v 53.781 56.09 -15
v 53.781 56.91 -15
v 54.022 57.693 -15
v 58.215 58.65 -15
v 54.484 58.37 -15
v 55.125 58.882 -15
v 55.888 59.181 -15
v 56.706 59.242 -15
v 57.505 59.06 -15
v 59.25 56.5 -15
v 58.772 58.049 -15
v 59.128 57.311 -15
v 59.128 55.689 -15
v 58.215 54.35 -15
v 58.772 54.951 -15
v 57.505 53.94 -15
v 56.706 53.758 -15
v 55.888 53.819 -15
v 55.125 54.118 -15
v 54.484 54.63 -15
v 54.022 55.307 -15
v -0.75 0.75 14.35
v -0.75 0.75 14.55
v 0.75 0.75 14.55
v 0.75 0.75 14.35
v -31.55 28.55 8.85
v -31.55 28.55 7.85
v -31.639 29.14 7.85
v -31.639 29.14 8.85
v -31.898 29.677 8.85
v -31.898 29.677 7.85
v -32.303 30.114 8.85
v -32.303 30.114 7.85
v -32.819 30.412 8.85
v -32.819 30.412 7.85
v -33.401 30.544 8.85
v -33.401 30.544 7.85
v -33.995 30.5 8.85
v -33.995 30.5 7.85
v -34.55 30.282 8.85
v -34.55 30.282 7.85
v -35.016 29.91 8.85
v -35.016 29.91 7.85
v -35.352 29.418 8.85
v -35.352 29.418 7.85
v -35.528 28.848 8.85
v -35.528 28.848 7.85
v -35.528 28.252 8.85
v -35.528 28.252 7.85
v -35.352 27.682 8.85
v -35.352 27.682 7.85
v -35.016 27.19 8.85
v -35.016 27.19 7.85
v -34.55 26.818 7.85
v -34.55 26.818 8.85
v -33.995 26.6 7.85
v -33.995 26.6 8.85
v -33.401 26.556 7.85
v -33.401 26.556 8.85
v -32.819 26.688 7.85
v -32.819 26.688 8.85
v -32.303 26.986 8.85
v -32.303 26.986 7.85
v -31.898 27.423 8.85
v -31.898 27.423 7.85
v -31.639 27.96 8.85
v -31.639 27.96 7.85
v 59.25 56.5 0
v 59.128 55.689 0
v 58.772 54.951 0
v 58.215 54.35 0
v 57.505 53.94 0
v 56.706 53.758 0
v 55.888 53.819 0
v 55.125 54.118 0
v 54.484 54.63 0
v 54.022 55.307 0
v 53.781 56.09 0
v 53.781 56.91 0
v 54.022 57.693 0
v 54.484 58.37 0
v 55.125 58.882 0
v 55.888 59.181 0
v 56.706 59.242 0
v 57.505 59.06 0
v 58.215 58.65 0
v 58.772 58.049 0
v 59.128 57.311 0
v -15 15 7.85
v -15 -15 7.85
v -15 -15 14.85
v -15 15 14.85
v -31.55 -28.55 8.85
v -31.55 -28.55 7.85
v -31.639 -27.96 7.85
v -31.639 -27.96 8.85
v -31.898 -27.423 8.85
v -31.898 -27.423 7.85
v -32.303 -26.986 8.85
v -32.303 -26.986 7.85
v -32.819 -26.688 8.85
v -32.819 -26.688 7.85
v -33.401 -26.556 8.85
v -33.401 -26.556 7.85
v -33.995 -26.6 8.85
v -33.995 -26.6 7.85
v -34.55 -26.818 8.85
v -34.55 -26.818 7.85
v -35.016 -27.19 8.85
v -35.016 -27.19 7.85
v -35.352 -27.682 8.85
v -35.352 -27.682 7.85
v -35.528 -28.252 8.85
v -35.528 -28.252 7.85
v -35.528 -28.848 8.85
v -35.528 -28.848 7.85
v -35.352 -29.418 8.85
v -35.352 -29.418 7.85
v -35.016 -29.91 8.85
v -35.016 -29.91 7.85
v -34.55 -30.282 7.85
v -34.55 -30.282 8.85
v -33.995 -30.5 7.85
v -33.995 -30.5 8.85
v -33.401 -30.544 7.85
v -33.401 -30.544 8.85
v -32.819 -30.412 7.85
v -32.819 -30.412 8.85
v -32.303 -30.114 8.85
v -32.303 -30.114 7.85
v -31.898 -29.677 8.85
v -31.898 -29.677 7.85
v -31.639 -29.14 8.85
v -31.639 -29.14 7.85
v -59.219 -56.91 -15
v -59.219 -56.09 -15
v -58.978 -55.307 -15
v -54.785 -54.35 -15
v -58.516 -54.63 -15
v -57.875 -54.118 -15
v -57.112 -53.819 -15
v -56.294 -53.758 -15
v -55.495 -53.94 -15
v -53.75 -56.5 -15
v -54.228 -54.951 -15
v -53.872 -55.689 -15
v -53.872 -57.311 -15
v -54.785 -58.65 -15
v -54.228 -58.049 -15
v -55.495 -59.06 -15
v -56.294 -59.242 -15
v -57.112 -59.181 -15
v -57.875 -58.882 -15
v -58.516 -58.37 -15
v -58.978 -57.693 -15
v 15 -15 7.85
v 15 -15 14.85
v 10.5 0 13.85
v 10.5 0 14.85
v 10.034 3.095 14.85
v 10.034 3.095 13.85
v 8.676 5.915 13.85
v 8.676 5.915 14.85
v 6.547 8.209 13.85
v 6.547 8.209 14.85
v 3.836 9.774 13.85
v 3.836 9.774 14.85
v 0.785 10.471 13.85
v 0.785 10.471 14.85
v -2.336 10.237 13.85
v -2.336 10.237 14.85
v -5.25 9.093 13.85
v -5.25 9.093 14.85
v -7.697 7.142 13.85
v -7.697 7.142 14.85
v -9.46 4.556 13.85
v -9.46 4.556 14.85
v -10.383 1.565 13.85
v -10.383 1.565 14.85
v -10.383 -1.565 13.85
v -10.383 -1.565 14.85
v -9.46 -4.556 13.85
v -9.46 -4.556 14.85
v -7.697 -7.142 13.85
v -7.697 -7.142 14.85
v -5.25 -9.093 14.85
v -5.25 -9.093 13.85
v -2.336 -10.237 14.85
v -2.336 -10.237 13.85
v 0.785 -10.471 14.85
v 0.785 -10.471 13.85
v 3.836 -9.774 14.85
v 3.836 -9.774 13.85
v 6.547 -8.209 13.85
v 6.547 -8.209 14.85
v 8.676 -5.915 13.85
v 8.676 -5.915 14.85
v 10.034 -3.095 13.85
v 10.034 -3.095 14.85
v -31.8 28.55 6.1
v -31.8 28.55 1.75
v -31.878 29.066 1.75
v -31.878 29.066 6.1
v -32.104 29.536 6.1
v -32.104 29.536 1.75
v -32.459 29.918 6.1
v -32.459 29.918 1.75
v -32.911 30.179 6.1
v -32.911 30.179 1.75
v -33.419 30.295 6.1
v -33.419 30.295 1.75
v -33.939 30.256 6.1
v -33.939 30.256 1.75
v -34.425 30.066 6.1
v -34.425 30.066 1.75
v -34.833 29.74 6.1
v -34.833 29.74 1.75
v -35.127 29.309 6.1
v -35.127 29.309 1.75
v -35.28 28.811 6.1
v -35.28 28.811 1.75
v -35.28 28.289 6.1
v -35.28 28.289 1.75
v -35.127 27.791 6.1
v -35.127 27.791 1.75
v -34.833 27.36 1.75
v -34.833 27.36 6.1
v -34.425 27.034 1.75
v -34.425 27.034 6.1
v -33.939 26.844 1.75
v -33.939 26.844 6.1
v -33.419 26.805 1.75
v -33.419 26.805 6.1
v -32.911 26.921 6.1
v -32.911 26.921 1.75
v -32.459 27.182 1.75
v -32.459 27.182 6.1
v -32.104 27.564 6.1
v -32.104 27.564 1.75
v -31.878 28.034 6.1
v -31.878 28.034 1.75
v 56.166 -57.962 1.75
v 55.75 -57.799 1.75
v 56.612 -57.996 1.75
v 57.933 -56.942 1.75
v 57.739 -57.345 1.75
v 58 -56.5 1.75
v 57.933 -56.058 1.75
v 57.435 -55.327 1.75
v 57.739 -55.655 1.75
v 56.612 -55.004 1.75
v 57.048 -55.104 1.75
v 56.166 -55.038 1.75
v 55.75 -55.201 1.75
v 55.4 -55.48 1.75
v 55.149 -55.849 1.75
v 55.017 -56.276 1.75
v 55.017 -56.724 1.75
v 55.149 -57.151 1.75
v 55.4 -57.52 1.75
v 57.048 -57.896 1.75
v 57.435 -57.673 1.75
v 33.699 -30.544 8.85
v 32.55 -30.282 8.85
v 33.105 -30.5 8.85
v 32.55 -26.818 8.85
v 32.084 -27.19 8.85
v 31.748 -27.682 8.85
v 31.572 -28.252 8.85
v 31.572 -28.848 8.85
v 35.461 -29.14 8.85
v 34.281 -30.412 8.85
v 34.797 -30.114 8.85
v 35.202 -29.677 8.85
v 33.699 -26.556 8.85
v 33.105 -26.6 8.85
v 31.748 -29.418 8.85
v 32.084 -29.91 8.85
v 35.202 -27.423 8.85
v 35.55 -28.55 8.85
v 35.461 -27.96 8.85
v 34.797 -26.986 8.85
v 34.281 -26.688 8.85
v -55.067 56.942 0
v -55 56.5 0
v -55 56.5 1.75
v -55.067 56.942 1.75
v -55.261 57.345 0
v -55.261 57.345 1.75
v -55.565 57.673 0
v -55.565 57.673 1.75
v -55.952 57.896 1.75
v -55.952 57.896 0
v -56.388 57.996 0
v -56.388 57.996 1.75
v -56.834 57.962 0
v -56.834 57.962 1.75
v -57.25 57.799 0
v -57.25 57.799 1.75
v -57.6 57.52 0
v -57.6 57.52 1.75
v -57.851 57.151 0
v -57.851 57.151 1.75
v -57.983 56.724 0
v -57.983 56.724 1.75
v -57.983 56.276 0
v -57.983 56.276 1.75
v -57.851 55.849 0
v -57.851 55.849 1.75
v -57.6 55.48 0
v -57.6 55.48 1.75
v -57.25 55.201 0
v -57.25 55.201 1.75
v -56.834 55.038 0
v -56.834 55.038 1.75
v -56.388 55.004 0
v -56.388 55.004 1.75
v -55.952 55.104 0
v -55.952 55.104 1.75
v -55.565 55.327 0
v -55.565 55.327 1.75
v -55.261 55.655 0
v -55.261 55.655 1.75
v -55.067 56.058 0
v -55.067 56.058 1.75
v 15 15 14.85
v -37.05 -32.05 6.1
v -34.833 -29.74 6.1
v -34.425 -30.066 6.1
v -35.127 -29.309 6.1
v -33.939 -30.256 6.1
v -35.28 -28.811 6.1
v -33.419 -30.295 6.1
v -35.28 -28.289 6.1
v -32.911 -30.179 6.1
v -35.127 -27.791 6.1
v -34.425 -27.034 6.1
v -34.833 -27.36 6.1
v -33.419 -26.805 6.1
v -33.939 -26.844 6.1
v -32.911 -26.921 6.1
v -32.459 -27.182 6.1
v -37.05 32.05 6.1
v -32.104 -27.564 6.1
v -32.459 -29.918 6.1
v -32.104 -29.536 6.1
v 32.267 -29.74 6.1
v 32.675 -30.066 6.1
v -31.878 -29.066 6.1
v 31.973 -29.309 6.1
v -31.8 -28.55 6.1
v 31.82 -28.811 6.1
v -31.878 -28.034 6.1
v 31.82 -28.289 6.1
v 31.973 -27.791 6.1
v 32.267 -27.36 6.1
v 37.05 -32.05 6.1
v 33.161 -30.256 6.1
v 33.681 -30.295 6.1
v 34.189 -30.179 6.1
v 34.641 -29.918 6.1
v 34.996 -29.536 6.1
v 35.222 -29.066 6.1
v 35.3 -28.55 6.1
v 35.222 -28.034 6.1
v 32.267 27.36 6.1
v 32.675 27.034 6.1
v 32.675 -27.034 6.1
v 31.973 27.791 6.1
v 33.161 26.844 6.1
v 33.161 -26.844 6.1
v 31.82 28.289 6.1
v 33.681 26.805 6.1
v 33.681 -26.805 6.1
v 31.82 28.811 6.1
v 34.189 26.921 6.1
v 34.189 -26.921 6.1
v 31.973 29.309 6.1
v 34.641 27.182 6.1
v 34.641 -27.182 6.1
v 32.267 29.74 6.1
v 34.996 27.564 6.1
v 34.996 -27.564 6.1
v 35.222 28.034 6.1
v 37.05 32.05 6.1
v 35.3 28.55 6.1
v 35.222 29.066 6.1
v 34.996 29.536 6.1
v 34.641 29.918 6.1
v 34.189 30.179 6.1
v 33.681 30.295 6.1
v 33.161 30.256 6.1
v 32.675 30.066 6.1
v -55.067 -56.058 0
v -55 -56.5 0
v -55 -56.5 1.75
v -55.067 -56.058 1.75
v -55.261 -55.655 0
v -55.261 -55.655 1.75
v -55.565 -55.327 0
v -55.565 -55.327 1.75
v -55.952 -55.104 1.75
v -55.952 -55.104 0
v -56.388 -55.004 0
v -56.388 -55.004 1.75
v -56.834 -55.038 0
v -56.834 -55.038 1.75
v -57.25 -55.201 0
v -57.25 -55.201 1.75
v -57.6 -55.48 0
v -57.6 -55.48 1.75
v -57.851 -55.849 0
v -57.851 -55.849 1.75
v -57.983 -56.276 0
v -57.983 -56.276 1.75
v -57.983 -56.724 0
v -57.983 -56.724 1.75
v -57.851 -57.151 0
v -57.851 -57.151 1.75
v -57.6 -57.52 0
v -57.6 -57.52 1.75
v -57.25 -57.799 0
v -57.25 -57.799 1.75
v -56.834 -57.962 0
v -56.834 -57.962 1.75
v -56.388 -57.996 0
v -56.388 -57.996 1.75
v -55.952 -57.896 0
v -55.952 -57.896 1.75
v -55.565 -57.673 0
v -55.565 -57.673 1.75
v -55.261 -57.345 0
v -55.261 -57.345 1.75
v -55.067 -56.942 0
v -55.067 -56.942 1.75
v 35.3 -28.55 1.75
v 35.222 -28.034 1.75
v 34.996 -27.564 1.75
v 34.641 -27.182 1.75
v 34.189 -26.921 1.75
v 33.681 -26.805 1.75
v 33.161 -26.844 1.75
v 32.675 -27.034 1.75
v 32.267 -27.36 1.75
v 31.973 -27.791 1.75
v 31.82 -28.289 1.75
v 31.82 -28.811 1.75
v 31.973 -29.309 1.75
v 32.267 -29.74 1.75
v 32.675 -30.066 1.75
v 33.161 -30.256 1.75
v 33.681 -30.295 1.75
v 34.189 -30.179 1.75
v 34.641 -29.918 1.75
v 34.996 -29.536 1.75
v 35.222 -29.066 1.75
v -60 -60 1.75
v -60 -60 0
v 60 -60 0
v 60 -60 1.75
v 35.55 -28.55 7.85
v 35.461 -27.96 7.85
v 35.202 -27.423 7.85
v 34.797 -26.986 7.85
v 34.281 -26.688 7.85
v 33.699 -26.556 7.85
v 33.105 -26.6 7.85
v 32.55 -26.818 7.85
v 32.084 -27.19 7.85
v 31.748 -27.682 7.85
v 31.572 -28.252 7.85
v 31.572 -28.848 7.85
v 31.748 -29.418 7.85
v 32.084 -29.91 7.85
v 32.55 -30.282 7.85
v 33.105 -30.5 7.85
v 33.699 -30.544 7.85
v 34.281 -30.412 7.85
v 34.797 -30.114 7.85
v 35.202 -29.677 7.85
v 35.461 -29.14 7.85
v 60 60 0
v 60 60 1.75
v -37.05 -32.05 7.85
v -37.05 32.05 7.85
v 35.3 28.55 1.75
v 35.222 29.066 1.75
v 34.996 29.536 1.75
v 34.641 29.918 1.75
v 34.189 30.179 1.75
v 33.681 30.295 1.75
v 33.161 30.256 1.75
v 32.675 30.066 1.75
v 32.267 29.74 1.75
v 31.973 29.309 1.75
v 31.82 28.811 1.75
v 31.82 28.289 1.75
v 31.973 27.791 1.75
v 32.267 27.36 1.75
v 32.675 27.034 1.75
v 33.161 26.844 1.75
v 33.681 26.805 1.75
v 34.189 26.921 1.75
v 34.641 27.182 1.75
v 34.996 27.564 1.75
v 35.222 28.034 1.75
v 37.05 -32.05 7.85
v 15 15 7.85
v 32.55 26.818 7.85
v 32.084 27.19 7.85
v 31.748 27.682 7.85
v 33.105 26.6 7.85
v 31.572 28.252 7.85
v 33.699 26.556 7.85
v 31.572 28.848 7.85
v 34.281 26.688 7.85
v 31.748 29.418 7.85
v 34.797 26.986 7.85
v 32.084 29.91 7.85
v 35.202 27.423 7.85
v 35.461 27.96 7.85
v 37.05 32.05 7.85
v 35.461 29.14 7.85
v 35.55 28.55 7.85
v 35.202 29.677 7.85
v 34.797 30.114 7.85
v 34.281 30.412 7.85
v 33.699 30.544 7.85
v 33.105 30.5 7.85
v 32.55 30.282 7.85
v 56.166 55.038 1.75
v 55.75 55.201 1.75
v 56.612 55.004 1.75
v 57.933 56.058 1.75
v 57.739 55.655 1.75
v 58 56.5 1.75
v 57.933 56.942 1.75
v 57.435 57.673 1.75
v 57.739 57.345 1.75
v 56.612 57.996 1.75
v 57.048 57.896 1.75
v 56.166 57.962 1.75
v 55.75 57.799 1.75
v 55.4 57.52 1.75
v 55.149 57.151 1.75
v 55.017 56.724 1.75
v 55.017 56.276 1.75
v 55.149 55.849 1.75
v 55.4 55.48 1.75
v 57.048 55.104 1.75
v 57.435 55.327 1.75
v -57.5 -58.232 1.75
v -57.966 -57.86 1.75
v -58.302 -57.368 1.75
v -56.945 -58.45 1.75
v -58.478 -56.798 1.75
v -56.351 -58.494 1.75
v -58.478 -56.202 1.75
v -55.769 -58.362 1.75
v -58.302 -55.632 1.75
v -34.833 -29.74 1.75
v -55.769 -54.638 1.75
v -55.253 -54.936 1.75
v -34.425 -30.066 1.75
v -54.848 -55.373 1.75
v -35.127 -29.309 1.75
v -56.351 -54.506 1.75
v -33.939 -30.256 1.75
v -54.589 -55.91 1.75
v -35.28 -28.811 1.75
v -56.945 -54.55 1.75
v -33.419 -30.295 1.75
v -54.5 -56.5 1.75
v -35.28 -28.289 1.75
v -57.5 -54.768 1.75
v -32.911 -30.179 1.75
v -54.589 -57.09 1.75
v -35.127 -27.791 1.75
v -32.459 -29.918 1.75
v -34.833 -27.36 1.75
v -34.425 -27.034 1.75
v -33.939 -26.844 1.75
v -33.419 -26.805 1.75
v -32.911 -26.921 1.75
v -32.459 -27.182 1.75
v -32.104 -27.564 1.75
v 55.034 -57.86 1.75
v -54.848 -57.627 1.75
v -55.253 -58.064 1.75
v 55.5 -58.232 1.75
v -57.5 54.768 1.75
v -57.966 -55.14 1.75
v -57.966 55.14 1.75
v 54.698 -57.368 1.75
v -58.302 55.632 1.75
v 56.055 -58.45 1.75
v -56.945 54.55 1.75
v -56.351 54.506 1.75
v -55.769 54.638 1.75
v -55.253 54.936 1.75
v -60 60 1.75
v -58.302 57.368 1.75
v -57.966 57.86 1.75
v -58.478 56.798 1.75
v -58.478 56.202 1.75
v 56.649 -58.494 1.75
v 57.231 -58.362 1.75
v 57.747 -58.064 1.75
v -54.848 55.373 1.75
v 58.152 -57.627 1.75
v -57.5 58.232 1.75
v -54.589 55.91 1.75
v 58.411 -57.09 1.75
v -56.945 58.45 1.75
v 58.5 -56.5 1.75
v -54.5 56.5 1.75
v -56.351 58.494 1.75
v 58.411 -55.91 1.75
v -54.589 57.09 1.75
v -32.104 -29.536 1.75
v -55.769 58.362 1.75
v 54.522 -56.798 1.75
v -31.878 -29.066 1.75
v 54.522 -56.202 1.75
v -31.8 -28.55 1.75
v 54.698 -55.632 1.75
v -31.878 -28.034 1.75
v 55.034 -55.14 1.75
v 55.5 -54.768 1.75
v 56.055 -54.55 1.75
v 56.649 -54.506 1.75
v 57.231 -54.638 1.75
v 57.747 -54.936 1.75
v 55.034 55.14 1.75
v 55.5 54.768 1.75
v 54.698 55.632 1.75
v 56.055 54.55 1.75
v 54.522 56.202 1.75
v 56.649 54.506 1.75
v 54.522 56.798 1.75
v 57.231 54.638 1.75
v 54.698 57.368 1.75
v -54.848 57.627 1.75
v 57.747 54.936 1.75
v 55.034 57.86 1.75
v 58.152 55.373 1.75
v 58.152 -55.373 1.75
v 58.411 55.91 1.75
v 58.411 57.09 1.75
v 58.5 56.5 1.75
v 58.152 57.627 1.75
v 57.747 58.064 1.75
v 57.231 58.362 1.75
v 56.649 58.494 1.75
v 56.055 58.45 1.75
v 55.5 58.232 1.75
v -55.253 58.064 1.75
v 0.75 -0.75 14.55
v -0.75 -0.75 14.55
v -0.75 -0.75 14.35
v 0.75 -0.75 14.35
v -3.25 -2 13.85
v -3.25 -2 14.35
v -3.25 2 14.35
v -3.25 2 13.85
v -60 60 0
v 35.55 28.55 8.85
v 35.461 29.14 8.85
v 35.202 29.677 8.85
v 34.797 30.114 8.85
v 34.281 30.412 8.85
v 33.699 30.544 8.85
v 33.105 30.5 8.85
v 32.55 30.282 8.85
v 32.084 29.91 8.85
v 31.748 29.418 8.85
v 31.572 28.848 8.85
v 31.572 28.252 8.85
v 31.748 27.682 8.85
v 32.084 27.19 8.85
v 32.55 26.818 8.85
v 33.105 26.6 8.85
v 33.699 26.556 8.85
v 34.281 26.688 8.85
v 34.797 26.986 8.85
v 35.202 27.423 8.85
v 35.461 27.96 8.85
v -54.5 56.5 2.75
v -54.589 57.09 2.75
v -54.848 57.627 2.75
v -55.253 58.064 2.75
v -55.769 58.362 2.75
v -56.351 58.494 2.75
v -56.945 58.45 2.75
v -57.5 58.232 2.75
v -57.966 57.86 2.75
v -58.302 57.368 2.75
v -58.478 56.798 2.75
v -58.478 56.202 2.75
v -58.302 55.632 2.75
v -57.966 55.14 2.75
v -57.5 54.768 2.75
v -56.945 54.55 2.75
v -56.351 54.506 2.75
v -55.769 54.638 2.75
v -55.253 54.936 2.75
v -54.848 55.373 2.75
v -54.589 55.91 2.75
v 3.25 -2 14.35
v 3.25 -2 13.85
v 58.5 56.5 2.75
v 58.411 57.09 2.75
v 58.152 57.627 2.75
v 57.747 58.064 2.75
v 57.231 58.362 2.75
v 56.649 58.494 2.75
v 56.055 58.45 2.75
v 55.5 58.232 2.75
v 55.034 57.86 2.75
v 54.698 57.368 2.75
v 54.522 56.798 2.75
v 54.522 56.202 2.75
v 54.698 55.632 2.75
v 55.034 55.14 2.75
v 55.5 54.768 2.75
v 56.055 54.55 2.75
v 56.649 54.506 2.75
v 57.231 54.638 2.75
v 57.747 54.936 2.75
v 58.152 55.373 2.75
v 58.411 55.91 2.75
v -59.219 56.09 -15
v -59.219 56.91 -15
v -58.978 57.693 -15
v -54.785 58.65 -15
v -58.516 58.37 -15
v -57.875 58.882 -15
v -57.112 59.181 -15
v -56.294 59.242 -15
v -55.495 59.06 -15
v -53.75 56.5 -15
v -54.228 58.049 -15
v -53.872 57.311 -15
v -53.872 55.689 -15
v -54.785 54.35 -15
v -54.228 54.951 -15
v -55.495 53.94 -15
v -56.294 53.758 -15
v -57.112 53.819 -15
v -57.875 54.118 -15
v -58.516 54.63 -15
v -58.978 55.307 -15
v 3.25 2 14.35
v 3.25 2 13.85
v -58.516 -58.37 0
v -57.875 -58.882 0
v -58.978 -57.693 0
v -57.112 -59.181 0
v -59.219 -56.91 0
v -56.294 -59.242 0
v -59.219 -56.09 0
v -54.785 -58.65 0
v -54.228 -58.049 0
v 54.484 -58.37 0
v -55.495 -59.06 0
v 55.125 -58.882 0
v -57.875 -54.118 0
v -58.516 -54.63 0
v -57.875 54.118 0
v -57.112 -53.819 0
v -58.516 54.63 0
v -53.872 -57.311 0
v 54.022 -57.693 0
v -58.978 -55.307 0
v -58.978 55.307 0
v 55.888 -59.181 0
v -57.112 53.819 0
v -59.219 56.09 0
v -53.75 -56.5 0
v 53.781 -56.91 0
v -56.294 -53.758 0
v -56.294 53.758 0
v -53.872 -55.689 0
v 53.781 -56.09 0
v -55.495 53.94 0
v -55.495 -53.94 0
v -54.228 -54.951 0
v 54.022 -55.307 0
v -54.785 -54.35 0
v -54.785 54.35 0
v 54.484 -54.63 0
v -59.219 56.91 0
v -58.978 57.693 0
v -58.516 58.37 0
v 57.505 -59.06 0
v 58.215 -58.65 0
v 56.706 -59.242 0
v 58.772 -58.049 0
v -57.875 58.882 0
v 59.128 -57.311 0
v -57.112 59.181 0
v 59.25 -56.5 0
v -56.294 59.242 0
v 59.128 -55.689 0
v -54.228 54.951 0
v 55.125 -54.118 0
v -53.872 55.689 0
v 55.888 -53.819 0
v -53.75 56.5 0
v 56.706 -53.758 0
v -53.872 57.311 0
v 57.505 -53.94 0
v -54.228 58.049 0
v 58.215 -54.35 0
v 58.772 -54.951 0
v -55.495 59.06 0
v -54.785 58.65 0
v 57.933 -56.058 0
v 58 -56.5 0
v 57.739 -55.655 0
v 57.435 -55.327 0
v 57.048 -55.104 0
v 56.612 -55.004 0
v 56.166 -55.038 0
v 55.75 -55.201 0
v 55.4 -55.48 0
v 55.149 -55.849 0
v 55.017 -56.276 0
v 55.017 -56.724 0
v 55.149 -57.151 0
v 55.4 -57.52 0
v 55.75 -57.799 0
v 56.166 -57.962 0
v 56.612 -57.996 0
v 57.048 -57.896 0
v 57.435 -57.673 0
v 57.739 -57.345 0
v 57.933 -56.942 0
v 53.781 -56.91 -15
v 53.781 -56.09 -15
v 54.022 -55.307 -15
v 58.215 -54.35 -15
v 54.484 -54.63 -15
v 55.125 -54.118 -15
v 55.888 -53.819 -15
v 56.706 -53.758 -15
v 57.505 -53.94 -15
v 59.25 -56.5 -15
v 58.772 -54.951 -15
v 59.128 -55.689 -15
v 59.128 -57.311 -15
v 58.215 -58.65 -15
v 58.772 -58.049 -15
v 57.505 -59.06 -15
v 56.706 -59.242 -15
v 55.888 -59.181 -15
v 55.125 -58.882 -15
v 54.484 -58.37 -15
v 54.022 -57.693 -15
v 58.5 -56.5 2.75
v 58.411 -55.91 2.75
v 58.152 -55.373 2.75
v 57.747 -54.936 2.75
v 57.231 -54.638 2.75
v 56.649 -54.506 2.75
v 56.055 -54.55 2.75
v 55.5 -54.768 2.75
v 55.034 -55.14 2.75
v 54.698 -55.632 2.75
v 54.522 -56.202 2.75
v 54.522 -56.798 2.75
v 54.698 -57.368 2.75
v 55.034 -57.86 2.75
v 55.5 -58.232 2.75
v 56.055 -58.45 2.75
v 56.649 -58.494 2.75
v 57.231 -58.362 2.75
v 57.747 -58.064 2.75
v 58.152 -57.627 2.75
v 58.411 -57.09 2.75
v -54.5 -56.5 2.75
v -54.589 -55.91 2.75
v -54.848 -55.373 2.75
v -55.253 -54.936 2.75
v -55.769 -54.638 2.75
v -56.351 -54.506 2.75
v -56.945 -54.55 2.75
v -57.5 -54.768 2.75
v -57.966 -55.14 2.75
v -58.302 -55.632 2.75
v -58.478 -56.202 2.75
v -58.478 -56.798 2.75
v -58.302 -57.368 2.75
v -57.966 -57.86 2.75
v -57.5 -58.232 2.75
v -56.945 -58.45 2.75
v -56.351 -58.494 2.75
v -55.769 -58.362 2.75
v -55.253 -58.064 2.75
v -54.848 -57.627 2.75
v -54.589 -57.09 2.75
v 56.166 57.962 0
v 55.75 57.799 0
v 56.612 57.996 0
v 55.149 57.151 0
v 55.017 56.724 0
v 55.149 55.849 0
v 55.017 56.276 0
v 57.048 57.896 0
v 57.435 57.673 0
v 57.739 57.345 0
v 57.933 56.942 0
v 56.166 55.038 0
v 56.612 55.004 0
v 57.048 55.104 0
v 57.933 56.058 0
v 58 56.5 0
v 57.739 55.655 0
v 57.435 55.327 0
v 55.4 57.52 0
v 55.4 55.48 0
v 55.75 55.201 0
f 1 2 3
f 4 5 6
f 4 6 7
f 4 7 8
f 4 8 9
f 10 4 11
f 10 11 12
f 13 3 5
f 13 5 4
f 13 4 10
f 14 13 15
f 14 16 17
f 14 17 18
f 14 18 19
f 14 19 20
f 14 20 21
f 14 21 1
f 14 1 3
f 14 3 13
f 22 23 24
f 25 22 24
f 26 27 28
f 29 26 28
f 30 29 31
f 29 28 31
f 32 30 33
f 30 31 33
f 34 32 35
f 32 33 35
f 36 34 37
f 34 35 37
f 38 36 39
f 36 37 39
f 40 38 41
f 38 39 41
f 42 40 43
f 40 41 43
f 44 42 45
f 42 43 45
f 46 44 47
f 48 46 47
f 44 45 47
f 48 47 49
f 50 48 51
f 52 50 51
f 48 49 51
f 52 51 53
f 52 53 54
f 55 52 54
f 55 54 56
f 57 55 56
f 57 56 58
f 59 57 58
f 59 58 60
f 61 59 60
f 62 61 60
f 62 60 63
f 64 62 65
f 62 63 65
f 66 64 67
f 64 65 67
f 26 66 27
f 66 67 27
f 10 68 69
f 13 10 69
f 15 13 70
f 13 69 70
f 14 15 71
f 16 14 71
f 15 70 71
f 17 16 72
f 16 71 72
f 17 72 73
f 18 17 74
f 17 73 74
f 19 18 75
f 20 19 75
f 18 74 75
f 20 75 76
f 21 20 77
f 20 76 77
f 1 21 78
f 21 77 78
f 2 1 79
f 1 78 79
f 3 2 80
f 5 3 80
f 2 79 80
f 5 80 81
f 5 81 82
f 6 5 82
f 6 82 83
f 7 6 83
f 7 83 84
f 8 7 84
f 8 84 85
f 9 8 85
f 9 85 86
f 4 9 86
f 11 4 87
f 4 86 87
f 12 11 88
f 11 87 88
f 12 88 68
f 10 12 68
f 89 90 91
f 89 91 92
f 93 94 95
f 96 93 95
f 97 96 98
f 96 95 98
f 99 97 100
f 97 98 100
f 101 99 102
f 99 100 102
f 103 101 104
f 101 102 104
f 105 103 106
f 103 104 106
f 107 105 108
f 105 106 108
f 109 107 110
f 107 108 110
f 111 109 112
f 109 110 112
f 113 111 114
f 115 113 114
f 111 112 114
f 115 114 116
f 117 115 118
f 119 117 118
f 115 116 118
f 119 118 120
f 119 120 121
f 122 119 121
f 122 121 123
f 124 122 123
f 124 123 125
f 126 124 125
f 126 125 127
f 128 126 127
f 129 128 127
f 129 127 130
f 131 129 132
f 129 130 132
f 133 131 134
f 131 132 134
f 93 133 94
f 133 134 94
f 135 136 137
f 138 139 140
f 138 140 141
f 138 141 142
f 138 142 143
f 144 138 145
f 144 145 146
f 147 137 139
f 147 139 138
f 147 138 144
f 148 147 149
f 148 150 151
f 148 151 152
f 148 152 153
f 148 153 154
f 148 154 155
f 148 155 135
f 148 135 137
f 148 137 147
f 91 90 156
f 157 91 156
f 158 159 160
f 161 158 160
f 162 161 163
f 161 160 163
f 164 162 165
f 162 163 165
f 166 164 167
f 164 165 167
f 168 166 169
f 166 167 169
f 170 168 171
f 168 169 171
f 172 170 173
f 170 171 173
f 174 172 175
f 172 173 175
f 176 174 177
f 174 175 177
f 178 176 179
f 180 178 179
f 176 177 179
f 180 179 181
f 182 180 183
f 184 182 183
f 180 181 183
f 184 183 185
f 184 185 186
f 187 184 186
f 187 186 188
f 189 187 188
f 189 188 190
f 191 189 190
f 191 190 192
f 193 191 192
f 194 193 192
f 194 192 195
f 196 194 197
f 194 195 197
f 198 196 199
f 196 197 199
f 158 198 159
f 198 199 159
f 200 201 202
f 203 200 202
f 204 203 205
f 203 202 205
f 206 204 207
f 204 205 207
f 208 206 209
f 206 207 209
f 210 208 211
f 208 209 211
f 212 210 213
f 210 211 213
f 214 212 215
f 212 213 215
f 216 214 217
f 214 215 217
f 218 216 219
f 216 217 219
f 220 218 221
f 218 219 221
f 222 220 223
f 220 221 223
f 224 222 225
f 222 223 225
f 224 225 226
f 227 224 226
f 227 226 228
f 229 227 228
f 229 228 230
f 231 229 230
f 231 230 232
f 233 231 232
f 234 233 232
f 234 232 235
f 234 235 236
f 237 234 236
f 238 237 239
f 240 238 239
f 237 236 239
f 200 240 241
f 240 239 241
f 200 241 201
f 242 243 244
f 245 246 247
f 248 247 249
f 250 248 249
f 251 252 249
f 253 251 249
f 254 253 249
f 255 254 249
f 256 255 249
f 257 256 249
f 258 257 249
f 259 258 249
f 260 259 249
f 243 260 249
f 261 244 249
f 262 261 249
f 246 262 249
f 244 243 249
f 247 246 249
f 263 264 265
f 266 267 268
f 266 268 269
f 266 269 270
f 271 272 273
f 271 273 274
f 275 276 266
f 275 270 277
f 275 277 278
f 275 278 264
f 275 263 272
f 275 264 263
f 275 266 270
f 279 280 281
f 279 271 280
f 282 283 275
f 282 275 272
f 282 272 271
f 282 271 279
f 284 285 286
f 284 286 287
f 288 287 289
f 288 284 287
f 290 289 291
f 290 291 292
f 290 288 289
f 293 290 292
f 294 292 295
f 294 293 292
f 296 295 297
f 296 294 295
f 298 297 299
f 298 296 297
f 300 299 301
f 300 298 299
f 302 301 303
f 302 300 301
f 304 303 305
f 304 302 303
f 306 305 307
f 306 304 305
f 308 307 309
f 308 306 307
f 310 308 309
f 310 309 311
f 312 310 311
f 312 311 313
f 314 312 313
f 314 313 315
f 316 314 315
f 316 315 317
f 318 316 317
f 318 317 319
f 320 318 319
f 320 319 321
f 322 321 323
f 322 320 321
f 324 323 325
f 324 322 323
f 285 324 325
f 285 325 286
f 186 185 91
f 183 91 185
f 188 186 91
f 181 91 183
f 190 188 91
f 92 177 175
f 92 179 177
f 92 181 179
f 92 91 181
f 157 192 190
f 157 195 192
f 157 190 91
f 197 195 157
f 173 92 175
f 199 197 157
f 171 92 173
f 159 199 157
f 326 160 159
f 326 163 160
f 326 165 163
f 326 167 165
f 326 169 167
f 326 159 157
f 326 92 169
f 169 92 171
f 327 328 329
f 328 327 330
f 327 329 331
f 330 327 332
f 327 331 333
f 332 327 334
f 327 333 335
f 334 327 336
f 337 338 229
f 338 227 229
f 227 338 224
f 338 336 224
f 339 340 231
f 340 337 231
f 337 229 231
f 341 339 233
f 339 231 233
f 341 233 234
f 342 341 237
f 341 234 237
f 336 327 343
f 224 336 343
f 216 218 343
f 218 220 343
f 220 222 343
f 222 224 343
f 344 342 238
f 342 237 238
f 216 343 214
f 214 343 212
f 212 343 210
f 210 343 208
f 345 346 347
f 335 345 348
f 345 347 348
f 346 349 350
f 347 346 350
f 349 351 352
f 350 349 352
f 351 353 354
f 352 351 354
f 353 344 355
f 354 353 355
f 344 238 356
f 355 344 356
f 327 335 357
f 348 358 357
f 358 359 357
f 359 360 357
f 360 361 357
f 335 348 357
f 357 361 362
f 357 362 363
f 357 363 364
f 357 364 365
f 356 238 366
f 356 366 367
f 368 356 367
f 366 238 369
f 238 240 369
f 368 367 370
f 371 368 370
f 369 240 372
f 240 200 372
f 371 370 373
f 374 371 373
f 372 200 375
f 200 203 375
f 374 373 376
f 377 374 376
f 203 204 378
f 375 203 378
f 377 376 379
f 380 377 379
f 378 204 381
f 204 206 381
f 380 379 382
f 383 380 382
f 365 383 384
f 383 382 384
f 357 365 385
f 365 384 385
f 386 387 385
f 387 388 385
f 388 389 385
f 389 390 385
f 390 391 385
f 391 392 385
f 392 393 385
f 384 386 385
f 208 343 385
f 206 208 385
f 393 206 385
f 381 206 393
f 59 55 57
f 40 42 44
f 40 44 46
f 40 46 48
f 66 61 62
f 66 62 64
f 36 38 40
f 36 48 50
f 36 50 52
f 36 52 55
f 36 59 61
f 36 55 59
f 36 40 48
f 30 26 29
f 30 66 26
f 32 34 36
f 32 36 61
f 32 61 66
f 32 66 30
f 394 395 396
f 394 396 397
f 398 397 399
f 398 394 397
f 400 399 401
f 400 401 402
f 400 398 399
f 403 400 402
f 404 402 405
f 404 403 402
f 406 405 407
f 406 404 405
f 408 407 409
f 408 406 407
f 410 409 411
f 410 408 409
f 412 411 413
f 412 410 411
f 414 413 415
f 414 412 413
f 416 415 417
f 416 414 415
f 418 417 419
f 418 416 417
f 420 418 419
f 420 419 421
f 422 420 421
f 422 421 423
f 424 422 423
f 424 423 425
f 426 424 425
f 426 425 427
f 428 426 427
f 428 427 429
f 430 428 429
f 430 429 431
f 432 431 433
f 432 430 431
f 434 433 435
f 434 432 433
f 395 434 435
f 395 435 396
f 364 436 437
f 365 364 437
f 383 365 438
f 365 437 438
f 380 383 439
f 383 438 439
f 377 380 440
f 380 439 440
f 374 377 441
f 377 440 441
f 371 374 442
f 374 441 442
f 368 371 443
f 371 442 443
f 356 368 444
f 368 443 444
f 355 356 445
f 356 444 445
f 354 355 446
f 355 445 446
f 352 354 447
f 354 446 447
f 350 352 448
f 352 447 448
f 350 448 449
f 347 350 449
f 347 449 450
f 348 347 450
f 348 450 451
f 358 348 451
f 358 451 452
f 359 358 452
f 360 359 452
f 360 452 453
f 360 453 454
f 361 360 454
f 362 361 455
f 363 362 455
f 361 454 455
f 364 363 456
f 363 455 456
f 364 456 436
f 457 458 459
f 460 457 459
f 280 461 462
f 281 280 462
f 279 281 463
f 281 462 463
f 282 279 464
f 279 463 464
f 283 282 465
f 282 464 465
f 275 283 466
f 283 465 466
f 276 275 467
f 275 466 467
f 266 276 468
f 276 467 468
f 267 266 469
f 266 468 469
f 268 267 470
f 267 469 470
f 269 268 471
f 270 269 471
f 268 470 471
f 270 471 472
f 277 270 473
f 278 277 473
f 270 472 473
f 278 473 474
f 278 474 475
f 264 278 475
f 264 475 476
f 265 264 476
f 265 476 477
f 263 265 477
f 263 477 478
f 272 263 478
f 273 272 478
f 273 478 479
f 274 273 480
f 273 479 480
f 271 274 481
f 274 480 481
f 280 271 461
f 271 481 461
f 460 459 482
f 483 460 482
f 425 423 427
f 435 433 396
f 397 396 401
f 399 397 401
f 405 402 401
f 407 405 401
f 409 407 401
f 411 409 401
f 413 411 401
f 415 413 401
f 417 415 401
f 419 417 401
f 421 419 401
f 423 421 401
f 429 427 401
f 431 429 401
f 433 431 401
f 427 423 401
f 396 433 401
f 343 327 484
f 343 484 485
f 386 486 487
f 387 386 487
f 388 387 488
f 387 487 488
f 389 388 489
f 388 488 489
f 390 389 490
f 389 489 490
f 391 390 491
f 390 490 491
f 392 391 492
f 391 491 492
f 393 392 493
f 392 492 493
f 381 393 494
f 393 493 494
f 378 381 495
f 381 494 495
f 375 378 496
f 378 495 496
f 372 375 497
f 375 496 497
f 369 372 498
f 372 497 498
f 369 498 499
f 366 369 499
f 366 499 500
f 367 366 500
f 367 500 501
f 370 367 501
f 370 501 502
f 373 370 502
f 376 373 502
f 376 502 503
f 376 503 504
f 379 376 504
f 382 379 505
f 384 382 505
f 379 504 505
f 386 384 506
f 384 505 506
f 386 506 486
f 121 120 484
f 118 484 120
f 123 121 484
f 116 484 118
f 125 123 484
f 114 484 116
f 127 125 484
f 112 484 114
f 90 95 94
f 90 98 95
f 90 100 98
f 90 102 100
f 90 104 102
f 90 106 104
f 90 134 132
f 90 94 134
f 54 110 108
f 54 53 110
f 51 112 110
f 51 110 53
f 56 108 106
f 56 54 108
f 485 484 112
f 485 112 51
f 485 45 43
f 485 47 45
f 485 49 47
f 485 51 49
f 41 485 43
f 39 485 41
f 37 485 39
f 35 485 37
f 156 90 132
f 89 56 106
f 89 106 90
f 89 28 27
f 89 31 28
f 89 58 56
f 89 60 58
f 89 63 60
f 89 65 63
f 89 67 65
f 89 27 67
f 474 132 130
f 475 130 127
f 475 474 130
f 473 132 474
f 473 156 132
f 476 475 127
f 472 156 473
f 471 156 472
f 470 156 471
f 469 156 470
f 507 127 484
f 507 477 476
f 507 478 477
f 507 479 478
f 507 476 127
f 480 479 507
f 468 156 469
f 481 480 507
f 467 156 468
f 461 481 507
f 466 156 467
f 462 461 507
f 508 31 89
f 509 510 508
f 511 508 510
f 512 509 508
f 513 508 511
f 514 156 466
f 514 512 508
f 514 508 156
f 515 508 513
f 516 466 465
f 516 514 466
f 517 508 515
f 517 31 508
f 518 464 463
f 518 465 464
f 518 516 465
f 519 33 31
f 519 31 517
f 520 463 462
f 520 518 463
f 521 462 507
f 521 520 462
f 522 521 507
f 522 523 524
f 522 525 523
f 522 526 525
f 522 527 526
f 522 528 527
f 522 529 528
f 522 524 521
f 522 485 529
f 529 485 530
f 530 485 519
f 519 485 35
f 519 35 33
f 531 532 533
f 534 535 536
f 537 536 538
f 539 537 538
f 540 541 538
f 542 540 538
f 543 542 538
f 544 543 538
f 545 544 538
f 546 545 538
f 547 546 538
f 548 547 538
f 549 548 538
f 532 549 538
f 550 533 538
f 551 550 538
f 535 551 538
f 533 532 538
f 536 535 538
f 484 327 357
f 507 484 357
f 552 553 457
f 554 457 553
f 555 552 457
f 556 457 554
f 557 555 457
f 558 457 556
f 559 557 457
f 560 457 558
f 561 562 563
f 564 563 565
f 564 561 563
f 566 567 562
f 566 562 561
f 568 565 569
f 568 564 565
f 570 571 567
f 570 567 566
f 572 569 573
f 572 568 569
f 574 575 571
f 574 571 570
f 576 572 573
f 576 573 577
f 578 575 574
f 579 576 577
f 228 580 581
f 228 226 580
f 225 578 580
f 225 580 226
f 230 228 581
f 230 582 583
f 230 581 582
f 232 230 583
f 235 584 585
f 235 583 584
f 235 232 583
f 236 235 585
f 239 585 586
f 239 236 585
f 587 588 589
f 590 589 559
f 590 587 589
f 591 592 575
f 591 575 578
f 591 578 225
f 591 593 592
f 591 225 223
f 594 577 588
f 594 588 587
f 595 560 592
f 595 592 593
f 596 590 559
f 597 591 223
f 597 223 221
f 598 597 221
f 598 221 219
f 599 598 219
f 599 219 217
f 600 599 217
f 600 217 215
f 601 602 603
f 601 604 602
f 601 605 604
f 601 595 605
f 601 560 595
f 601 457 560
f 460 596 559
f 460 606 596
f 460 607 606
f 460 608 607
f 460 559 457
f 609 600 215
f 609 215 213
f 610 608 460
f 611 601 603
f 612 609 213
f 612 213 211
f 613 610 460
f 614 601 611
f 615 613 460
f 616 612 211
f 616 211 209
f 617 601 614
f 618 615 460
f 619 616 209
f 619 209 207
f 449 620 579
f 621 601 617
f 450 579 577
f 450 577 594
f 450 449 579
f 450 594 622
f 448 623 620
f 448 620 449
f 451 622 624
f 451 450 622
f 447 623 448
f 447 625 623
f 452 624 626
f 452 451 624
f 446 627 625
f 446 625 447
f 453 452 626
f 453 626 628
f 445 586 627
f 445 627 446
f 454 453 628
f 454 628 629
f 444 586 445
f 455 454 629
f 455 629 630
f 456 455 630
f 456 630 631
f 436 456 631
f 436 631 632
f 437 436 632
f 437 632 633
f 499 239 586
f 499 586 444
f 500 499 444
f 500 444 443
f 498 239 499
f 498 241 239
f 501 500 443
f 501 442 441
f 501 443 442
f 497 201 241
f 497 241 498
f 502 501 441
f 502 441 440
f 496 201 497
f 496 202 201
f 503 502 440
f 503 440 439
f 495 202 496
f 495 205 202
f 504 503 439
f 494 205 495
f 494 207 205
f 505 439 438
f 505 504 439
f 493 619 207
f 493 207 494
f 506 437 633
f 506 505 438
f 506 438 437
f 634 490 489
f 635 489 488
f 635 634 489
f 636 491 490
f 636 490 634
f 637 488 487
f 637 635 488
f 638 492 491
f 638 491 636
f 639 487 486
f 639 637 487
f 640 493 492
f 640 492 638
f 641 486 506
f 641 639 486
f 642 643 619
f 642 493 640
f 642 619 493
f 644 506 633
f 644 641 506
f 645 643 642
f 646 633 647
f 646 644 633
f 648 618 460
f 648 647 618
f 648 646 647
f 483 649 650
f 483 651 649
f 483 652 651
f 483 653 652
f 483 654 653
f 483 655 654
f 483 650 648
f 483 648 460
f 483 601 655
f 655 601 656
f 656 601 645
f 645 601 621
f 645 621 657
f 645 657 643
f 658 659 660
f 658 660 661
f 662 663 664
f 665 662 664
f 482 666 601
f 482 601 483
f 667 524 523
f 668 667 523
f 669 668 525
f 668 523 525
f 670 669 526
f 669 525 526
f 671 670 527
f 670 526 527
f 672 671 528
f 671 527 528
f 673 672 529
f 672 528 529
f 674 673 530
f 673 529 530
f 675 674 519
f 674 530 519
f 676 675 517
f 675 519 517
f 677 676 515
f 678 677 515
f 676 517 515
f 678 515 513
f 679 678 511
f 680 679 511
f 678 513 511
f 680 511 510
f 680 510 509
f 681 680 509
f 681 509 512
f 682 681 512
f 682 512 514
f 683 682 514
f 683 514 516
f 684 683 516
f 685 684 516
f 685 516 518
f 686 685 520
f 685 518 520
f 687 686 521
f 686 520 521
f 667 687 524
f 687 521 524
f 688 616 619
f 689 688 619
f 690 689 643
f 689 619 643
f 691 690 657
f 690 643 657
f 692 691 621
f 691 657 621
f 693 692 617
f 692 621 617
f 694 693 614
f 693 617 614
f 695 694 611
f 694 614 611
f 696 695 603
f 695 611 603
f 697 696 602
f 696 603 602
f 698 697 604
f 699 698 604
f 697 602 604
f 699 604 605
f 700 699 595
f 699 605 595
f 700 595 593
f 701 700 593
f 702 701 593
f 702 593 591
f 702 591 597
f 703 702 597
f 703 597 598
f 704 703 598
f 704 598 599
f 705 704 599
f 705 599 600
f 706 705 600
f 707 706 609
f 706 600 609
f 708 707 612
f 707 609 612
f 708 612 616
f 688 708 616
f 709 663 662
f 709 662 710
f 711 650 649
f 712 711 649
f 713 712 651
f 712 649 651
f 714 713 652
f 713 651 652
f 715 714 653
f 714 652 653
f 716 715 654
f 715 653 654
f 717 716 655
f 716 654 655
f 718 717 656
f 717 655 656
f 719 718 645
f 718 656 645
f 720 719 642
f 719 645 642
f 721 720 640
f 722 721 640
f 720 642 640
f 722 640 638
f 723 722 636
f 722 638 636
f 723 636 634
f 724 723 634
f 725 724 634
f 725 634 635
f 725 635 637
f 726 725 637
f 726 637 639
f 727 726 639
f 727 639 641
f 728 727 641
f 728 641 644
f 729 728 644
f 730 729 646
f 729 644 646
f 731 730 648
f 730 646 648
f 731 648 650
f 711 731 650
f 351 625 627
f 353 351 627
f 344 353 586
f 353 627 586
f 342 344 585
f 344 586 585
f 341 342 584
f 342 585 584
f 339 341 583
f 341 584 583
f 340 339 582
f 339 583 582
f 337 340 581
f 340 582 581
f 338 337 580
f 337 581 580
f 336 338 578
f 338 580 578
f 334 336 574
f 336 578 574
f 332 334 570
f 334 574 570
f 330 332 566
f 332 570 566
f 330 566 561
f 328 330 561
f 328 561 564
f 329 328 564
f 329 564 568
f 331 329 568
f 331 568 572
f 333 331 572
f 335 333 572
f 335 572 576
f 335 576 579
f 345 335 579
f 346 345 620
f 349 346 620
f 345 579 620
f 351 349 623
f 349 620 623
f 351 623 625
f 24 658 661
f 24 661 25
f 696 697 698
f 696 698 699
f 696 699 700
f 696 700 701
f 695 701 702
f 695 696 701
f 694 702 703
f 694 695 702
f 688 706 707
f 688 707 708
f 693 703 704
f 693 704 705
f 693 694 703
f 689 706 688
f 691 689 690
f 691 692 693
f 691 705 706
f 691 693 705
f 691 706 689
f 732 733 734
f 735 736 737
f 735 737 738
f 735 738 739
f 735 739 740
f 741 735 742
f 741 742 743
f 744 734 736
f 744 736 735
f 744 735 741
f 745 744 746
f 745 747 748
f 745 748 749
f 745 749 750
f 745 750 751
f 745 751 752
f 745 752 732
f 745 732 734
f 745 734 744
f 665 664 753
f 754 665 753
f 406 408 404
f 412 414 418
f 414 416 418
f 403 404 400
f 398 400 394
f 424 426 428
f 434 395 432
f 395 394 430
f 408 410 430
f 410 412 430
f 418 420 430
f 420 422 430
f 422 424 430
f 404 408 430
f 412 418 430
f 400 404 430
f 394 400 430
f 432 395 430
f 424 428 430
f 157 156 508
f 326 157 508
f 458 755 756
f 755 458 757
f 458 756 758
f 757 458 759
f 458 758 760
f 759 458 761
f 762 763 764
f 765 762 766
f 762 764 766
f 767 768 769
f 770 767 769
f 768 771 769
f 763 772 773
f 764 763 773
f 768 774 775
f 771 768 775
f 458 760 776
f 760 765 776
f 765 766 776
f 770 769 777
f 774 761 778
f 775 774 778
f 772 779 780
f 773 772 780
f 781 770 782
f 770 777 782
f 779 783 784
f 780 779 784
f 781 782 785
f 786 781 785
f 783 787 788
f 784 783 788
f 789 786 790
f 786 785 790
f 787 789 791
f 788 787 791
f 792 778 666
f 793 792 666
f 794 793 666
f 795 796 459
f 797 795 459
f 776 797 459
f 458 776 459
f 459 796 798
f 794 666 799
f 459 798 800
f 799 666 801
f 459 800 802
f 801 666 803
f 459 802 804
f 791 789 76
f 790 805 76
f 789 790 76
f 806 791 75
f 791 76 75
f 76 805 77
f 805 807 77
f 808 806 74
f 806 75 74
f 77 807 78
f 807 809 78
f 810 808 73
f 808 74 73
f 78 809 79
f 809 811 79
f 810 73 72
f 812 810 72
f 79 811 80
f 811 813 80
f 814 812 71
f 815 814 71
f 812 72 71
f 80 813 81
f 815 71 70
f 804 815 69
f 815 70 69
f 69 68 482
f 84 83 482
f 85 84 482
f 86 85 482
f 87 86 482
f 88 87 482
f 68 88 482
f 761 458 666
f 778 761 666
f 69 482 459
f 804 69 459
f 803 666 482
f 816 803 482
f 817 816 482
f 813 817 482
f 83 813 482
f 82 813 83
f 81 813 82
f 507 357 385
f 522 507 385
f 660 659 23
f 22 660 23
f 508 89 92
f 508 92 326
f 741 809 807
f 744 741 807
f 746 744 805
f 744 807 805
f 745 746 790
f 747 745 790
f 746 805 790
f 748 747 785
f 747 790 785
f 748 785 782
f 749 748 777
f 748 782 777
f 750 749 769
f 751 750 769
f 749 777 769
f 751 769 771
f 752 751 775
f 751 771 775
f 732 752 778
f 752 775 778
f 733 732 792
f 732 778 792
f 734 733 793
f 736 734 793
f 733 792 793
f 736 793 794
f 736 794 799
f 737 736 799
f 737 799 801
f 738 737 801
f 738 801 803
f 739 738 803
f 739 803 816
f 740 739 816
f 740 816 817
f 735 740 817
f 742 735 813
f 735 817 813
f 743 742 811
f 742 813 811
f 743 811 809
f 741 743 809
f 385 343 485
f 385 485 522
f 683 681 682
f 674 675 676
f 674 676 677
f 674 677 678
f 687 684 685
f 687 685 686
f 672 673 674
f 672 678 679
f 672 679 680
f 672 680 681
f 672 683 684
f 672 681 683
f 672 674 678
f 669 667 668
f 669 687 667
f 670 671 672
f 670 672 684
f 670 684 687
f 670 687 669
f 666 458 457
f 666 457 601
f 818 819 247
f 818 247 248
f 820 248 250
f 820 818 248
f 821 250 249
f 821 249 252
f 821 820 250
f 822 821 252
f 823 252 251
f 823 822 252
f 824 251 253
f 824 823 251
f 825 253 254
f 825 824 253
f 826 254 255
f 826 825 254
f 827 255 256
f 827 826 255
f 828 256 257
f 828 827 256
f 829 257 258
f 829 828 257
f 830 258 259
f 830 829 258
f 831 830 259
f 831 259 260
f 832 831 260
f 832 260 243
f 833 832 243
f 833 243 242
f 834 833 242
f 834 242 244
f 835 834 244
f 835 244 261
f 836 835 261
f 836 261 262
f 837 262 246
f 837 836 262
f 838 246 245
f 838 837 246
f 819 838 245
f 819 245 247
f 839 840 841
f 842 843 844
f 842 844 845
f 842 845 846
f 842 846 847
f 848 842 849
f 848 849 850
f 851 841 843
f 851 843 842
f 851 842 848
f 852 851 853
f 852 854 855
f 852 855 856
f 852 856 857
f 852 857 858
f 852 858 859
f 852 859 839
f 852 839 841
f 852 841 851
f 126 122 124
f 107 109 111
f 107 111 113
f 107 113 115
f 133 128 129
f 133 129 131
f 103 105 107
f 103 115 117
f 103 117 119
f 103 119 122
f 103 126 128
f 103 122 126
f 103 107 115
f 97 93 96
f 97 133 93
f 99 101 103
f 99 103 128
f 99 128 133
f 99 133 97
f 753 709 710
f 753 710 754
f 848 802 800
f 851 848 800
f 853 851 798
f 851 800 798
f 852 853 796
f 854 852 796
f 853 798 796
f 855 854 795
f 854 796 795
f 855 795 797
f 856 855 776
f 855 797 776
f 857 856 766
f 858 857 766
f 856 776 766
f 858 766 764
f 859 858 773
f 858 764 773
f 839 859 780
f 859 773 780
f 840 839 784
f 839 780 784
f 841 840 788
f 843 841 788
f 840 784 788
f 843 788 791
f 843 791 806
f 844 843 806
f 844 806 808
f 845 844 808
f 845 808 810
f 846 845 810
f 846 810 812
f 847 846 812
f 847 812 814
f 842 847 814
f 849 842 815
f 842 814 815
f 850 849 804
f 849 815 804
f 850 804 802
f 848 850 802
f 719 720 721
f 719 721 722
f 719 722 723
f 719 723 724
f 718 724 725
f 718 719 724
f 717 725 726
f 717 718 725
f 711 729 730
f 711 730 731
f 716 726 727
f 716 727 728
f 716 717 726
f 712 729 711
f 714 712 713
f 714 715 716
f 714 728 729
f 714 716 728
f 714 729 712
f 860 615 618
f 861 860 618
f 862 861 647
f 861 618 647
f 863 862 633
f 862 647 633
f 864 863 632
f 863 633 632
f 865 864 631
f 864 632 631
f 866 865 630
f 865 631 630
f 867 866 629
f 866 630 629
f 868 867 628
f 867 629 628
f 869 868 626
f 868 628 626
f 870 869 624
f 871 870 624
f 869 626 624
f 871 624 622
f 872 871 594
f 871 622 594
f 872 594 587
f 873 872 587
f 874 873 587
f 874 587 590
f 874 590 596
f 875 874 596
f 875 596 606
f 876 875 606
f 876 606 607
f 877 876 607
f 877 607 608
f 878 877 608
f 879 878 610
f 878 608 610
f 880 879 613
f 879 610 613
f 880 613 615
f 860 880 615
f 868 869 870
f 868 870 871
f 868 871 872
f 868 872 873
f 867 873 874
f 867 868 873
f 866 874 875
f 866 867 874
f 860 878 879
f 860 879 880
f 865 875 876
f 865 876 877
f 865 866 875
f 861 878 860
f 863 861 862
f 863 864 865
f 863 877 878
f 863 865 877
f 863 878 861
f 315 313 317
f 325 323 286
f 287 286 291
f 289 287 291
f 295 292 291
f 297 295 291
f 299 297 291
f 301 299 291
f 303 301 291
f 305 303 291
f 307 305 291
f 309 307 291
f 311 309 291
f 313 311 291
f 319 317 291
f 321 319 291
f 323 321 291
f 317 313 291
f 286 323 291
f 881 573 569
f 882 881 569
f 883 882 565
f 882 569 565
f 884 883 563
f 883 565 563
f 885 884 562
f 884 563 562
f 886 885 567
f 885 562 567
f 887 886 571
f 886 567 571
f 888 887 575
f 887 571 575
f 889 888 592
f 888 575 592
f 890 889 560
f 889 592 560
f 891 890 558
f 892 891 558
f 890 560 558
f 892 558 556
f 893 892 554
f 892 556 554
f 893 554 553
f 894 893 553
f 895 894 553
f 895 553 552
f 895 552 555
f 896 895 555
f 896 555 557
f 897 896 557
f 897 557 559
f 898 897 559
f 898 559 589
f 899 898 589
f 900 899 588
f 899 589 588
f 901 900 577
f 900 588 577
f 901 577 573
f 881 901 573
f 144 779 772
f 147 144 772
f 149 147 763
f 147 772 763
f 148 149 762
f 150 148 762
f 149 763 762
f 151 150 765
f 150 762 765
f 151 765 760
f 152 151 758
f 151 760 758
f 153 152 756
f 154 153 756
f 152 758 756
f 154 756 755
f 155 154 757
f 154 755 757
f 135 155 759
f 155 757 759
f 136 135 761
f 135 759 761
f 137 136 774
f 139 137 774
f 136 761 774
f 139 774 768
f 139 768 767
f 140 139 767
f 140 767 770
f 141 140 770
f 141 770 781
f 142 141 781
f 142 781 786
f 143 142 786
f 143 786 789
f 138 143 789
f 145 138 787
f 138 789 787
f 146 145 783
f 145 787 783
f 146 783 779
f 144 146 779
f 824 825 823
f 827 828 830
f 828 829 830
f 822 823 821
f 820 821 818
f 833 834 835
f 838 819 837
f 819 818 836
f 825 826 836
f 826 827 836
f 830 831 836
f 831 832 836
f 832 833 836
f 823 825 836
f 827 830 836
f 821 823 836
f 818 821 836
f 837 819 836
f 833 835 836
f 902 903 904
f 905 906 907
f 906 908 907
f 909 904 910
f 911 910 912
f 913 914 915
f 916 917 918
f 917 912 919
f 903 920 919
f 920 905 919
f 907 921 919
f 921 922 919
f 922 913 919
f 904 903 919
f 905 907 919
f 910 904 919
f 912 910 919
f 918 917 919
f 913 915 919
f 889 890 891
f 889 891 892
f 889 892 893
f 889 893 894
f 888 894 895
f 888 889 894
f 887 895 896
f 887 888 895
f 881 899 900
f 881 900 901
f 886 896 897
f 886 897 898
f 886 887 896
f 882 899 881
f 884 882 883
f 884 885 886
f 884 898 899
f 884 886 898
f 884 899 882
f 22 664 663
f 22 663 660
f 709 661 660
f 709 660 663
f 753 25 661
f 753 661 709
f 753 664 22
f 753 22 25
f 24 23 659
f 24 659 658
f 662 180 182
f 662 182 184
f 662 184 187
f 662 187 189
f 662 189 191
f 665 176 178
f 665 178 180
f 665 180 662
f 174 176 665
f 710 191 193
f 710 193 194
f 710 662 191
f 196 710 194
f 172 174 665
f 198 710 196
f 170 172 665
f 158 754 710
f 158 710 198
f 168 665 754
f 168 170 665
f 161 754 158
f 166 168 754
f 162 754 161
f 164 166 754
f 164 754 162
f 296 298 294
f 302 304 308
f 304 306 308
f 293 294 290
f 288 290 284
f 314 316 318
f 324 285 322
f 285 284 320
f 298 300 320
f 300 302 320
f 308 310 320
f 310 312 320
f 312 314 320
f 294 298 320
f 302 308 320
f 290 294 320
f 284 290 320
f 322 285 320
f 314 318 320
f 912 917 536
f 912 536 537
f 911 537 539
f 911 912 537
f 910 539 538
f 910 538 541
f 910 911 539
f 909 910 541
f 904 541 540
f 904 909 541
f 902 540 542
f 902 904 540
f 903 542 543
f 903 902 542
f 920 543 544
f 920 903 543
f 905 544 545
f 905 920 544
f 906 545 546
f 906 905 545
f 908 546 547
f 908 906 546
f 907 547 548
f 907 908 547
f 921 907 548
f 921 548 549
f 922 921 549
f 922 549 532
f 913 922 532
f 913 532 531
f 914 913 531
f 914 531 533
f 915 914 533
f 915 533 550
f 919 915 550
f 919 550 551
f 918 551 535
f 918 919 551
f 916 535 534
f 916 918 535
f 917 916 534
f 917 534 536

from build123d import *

# Parameters (mm, degrees)
F0_W      = 120
F0_H      = 120
F0_R      = 1.5
F1_DEPTH  = 1.75
F2_R      = 2.75
F2_R_2    = 1.5
F3_DEPTH  = 15
F4_R      = 2
F4_R_2    = 1.5
F5_DEPTH  = 1
F4_R_3    = 1.75
F6_DEPTH  = 4.35
F7_W      = 74.1
F7_H      = 64.1
F8_DEPTH  = 1.75
F9_R      = 2
F10_DEPTH = 1
F9_W      = 30
F9_H      = 30
F11_DEPTH = 7
F12_R     = 10.5
F12_W     = 6.5
F12_H     = 4
F13_DEPTH = 1
F12_W_2   = 1.5
F12_H_2   = 1.5
F14_DEPTH = 0.3
F15_DEPTH = 0.5


with BuildPart() as f1:
    # F0 (on Top) → F1 (new body)
    with BuildSketch(Plane.XY):
        Rectangle(F0_W, F0_H)
        with Locations((-56.5, -56.5)):
            Circle(F0_R, mode=Mode.SUBTRACT)
        with Locations((56.5, -56.5)):
            Circle(F0_R, mode=Mode.SUBTRACT)
        with Locations((-56.5, 56.5)):
            Circle(F0_R, mode=Mode.SUBTRACT)
        with Locations((56.5, 56.5)):
            Circle(F0_R, mode=Mode.SUBTRACT)
    extrude(amount=F1_DEPTH)

    # F2 (on face) → F3 (join)
    with BuildSketch(Plane(origin=(0, 0, 0), x_dir=(1, 0, 0), z_dir=(0, 0, -1))):
        with Locations((56.5, -56.5)):
            Circle(F2_R)
        with Locations((56.5, -56.5)):
            Circle(F2_R_2, mode=Mode.SUBTRACT)
        with Locations((-56.5, -56.5)):
            Circle(F2_R)
        with Locations((-56.5, -56.5)):
            Circle(F2_R_2, mode=Mode.SUBTRACT)
        with Locations((-56.5, 56.5)):
            Circle(F2_R)
        with Locations((-56.5, 56.5)):
            Circle(F2_R_2, mode=Mode.SUBTRACT)
        with Locations((56.5, 56.5)):
            Circle(F2_R)
        with Locations((56.5, 56.5)):
            Circle(F2_R_2, mode=Mode.SUBTRACT)
        with Locations((-56.5, 56.5)):
            Circle(F2_R_2)
        with Locations((56.5, 56.5)):
            Circle(F2_R_2)
        with Locations((-56.5, -56.5)):
            Circle(F2_R_2)
        with Locations((56.5, -56.5)):
            Circle(F2_R_2)
    extrude(amount=F3_DEPTH)

    # F4 (on face) → F5 (join)
    with BuildSketch(Plane.XY.offset(1.75)):
        with Locations((-56.5, 56.5)):
            Circle(F4_R)
        with Locations((-56.5, 56.5)):
            Circle(F4_R_2, mode=Mode.SUBTRACT)
        with Locations((-56.5, 56.5)):
            Circle(F4_R_2)
        with Locations((56.5, 56.5)):
            Circle(F4_R)
        with Locations((56.5, 56.5)):
            Circle(F4_R_2, mode=Mode.SUBTRACT)
        with Locations((56.5, 56.5)):
            Circle(F4_R_2)
        with Locations((56.5, -56.5)):
            Circle(F4_R)
        with Locations((56.5, -56.5)):
            Circle(F4_R_2, mode=Mode.SUBTRACT)
        with Locations((56.5, -56.5)):
            Circle(F4_R_2)
        with Locations((-56.5, -56.5)):
            Circle(F4_R)
        with Locations((-56.5, -56.5)):
            Circle(F4_R_2, mode=Mode.SUBTRACT)
        with Locations((-56.5, -56.5)):
            Circle(F4_R_2)
    extrude(amount=F5_DEPTH)

    # F4 (on face) → F6 (join)
    with BuildSketch(Plane.XY.offset(1.75)):
        with Locations((-33.55, -28.55)):
            Circle(F4_R_3)
        with Locations((33.55, -28.55)):
            Circle(F4_R_3)
        with Locations((33.55, 28.55)):
            Circle(F4_R_3)
        with Locations((-33.55, 28.55)):
            Circle(F4_R_3)
    extrude(amount=F6_DEPTH)

    # F7 (on face) → F8 (join)
    with BuildSketch(Plane.XY.offset(6.1)):
        Rectangle(F7_W, F7_H)
    extrude(amount=F8_DEPTH)

    # F9 (on face) → F10 (join)
    with BuildSketch(Plane.XY.offset(7.85)):
        with Locations((33.55, 28.55)):
            Circle(F9_R)
        with Locations((-33.55, 28.55)):
            Circle(F9_R)
        with Locations((33.55, -28.55)):
            Circle(F9_R)
        with Locations((-33.55, -28.55)):
            Circle(F9_R)
    extrude(amount=F10_DEPTH)

    # F9 (on face) → F11 (join)
    with BuildSketch(Plane.XY.offset(7.85)):
        Rectangle(F9_W, F9_H)
    extrude(amount=F11_DEPTH)

    # F12 (on face) → F13 (cut)
    with BuildSketch(Plane.XY.offset(14.85)):
        Circle(F12_R)
        Rectangle(F12_W, F12_H, mode=Mode.SUBTRACT)
    extrude(amount=-F13_DEPTH, mode=Mode.SUBTRACT)

    # F12 (on face) → F14 (cut)
    with BuildSketch(Plane.XY.offset(14.85)):
        Rectangle(F12_W_2, F12_H_2)
    extrude(amount=-F14_DEPTH, mode=Mode.SUBTRACT)

    # F12 (on face) → F15 (cut)
    with BuildSketch(Plane.XY.offset(14.85)):
        Rectangle(F12_W, F12_H)
        Rectangle(F12_W_2, F12_H_2, mode=Mode.SUBTRACT)
    extrude(amount=-F15_DEPTH, mode=Mode.SUBTRACT)


solid = f1.part
